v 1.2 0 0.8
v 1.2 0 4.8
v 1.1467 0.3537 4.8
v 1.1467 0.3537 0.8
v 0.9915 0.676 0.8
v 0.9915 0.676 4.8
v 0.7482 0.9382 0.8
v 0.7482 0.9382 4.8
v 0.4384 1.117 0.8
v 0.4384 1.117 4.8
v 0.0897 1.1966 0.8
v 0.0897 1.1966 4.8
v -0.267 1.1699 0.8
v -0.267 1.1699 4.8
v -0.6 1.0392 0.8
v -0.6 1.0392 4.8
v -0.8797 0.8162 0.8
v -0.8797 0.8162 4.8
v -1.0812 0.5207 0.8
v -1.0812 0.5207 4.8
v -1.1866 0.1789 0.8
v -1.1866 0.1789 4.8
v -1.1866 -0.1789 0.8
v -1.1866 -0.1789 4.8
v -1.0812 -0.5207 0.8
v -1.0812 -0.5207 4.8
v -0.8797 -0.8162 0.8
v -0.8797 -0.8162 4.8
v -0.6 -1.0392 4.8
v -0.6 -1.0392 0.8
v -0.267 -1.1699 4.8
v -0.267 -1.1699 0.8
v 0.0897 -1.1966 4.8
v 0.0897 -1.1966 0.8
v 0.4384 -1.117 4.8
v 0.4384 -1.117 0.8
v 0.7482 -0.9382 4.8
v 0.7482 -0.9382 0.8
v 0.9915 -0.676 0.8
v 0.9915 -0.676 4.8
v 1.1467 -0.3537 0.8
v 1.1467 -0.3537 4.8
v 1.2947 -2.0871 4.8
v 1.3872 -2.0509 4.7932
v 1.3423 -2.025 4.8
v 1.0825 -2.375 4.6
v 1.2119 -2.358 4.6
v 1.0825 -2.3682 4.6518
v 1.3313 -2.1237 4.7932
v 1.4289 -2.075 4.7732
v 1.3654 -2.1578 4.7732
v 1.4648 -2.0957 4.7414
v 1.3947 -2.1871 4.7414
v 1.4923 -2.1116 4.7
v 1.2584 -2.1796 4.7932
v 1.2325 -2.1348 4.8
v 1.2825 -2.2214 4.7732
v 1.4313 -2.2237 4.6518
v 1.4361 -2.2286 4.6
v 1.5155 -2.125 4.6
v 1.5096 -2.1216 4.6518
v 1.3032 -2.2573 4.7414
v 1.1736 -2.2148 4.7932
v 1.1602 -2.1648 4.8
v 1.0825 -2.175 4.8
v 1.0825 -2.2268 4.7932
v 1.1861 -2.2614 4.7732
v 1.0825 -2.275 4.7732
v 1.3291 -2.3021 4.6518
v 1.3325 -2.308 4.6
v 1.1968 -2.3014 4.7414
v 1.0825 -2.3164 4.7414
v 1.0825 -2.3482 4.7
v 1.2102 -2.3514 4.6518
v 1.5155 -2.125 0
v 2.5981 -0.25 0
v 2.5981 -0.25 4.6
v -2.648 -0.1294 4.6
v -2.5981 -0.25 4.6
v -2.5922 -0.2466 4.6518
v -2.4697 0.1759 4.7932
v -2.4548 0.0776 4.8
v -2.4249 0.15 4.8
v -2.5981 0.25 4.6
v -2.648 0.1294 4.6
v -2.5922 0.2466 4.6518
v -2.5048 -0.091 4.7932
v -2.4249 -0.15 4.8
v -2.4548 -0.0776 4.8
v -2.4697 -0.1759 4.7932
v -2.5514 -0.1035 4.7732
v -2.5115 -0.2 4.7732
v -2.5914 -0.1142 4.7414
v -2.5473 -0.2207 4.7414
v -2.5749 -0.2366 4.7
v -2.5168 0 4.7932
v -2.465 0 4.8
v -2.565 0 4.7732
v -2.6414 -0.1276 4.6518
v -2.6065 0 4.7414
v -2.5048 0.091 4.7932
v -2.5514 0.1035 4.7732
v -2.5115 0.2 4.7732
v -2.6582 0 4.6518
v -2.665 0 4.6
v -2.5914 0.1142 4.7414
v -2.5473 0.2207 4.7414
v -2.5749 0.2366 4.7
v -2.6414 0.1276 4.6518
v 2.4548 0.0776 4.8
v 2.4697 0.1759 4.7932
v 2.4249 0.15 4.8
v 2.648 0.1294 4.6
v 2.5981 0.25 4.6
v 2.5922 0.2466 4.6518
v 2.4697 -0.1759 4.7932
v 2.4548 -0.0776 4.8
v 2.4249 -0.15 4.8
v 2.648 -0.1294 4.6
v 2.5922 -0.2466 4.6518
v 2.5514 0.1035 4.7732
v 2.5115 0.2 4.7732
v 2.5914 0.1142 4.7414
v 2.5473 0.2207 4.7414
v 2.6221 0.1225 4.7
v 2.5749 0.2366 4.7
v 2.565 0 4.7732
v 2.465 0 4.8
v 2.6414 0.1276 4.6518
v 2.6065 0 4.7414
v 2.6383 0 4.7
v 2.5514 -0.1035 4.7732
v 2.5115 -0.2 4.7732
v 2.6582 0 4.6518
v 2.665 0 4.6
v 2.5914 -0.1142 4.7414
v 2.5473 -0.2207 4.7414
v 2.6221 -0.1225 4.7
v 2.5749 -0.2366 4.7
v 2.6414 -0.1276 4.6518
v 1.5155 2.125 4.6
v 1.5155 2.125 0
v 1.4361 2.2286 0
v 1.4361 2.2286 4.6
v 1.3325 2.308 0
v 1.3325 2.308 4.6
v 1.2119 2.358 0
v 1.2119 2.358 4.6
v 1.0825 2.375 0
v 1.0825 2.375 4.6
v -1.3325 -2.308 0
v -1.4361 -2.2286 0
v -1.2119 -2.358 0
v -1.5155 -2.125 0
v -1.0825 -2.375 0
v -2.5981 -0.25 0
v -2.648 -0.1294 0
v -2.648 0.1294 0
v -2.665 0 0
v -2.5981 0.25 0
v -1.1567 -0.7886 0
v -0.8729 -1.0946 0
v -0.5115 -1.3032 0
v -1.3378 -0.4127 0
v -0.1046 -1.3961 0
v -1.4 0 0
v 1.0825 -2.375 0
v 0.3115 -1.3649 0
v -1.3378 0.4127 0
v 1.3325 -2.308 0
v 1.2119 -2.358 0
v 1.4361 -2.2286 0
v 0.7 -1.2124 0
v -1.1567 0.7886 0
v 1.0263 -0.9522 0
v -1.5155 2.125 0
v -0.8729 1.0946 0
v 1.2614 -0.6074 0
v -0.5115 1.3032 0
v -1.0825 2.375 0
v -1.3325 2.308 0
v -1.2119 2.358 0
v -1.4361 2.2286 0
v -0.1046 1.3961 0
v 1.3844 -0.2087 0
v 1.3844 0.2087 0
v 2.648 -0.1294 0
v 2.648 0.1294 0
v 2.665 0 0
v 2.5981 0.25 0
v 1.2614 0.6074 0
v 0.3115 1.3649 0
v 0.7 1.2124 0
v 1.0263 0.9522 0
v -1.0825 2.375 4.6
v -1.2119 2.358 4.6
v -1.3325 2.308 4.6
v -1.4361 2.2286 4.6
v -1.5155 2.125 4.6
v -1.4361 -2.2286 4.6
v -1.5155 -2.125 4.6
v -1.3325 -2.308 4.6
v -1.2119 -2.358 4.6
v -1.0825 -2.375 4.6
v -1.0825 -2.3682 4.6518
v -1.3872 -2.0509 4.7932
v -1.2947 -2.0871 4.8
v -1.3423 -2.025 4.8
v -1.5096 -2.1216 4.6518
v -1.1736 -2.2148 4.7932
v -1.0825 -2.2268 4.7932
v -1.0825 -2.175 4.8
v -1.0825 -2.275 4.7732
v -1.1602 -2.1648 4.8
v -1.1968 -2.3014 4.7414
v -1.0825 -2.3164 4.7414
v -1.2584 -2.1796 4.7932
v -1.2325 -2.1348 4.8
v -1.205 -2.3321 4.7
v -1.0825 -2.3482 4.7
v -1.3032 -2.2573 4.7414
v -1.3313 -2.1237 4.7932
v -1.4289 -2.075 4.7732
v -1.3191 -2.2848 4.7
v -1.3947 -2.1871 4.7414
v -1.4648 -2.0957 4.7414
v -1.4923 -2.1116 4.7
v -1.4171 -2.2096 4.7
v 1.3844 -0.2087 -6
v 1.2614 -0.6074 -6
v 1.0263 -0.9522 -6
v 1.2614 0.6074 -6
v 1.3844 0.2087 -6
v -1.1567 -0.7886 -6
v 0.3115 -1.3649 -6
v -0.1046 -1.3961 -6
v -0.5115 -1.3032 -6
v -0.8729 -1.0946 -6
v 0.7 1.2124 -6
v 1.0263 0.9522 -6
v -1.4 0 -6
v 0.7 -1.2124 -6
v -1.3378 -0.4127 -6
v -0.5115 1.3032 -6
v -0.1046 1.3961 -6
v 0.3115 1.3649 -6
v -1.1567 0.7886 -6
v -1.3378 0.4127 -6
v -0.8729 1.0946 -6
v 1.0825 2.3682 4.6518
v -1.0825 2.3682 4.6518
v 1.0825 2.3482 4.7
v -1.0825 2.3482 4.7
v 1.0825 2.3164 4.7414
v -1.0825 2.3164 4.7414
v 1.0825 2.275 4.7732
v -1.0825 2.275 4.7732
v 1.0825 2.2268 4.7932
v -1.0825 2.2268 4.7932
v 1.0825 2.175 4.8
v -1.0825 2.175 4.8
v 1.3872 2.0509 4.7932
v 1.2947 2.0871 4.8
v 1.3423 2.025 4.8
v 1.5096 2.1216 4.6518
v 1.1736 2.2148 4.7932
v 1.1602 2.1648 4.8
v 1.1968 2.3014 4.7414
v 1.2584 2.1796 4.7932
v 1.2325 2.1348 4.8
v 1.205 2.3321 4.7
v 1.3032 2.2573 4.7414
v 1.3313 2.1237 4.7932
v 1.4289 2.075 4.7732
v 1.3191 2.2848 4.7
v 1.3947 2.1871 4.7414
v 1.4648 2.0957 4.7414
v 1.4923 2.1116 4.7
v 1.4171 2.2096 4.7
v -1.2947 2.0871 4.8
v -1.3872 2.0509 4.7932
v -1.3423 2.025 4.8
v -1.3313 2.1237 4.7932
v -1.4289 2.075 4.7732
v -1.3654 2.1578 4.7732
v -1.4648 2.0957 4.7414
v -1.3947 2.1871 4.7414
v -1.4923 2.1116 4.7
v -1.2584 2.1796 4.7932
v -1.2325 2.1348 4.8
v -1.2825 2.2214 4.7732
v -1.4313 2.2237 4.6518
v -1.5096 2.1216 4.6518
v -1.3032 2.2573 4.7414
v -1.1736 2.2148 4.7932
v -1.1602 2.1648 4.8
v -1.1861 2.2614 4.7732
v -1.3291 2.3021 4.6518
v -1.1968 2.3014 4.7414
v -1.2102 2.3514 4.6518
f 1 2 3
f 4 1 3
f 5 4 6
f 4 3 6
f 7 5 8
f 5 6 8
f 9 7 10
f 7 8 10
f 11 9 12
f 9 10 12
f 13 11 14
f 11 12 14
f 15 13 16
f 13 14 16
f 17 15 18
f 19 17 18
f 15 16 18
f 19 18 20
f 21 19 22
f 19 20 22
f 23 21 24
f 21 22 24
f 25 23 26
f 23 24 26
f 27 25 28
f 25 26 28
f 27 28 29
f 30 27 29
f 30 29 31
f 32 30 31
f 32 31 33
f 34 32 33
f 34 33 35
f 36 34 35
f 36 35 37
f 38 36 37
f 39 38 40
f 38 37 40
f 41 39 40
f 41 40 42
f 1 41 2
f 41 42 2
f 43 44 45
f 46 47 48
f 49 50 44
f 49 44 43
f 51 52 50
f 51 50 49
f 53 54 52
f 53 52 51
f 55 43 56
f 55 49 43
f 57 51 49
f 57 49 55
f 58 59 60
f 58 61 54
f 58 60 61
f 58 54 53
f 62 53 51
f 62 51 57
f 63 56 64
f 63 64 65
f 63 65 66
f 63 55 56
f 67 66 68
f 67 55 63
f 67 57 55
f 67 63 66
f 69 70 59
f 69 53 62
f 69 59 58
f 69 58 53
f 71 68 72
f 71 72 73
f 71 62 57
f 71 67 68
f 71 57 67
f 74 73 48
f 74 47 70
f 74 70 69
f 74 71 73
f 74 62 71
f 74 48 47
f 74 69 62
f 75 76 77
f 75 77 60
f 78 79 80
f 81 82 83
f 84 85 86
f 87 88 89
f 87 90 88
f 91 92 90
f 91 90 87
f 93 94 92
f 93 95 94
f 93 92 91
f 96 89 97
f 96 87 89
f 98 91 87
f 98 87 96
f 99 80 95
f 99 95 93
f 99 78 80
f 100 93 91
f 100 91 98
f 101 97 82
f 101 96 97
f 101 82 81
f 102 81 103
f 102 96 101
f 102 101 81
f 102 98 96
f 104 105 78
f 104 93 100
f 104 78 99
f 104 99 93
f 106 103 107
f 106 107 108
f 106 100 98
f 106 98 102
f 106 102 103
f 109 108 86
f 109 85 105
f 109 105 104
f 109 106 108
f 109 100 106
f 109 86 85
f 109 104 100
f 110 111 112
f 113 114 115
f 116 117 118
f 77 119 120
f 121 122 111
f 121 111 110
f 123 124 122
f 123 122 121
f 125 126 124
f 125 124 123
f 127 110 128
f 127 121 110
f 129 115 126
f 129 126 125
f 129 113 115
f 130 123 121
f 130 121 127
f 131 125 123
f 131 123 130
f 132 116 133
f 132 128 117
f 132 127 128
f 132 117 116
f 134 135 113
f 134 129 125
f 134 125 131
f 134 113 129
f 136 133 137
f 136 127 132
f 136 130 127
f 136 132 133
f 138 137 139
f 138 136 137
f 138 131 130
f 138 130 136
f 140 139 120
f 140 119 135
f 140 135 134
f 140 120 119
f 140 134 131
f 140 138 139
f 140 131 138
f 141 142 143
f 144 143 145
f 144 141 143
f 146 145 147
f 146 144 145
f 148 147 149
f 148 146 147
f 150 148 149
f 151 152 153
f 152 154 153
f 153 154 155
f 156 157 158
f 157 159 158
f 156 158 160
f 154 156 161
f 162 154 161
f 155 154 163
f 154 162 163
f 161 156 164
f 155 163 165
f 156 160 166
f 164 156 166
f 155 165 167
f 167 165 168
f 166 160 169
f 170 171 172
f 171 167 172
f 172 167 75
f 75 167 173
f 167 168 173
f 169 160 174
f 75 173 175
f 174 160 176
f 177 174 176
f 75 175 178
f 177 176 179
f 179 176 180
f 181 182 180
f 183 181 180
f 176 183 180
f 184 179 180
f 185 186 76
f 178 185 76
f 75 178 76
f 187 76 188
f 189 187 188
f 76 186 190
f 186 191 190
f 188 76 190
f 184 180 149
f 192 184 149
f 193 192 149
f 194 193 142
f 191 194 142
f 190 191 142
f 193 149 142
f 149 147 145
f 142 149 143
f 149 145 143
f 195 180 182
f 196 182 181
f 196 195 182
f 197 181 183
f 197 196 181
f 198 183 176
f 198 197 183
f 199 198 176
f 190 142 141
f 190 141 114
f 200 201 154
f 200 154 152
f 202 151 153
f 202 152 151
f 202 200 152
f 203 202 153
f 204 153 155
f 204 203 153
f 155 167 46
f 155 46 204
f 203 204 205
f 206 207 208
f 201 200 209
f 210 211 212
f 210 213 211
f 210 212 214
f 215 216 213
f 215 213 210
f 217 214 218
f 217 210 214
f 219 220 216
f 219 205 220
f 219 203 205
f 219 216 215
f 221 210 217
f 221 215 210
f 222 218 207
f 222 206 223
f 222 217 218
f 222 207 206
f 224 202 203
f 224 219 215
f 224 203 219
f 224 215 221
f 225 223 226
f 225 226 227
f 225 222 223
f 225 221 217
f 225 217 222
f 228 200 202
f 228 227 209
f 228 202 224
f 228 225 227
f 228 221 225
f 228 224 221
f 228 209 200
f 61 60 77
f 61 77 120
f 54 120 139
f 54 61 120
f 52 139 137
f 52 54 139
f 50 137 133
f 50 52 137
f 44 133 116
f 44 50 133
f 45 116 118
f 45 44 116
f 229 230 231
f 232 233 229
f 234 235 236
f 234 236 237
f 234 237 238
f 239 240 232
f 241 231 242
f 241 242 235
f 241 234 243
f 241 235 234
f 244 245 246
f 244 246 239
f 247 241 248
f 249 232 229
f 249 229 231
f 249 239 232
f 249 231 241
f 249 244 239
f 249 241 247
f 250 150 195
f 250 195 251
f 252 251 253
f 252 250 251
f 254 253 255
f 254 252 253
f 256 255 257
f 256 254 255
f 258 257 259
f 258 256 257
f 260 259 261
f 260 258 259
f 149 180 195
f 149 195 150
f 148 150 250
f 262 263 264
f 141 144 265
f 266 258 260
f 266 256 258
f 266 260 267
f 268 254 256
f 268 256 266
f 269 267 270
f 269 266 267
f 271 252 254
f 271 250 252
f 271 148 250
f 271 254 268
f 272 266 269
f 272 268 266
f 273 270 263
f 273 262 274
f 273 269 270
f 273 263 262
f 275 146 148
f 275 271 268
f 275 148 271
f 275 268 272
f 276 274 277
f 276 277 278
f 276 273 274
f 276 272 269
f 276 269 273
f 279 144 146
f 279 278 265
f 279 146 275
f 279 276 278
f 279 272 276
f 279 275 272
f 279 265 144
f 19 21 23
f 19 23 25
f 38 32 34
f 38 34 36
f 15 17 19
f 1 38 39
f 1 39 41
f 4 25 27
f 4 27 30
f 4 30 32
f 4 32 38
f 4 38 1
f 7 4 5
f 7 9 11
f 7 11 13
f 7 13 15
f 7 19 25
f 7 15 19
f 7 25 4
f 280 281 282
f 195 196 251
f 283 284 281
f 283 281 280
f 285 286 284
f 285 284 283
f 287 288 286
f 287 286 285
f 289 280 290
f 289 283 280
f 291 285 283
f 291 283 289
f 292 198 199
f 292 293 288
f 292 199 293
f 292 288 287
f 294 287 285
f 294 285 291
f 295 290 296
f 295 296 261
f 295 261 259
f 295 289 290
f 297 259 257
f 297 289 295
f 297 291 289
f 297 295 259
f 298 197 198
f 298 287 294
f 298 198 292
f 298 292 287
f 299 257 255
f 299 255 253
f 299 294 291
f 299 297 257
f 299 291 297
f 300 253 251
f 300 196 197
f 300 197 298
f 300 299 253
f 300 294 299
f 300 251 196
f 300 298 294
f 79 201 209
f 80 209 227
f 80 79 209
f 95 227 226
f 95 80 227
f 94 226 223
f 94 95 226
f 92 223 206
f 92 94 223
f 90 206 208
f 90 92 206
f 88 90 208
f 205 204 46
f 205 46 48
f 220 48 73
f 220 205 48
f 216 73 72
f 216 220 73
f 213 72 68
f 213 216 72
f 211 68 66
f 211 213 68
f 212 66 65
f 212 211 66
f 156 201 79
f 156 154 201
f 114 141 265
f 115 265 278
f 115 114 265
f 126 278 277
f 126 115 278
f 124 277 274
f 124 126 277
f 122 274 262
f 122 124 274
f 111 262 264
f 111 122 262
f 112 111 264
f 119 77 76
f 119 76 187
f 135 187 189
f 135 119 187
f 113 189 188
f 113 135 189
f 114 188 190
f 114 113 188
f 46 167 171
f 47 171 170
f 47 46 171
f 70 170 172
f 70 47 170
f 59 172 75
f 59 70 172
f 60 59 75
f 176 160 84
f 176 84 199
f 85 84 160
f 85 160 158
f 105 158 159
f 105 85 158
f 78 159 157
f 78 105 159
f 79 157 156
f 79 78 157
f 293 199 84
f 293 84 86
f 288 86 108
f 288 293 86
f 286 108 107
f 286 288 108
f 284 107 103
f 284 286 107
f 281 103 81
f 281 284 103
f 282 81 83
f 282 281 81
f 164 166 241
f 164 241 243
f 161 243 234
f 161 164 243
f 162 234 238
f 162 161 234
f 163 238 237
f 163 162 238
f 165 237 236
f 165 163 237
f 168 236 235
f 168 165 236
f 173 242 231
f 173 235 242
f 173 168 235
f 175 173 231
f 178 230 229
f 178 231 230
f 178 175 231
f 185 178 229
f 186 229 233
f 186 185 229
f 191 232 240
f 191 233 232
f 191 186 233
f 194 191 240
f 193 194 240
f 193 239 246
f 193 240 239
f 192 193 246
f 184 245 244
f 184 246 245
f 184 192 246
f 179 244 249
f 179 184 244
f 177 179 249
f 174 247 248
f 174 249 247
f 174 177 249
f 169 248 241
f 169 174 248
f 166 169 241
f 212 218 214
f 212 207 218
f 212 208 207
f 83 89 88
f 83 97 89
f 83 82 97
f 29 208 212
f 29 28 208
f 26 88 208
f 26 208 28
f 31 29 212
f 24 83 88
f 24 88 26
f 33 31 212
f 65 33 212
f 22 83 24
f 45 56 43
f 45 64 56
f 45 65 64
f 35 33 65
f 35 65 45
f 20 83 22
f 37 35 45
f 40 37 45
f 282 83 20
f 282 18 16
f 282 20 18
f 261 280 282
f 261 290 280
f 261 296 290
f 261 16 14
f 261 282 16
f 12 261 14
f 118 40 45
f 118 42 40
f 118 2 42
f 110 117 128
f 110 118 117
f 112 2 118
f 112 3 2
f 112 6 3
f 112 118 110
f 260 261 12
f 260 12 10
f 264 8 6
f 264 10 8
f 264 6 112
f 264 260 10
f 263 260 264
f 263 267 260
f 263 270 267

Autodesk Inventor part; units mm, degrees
ref_plane "YZ Plane" through (0, 0, 0) normal (1, 0, 0) x (0, 1, 0)
ref_plane "XZ Plane" through (0, 0, 0) normal (0, 1, 0) x (-1, 0, 0)
ref_plane "XY Plane" through (0, 0, 0) normal (0, 0, 1) x (1, 0, 0)
sketch "Sketch1" plane through (0, 0, 0) normal (0, 0, 1) x (1, 0, 0)
  line L0 (2.7424, 0) -> (1.3712, -2.375)
  line L1 (1.3712, -2.375) -> (-1.3712, -2.375)
  line L2 (-1.3712, -2.375) -> (-2.7424, 0)
  line L3 (-2.7424, 0) -> (-1.3712, 2.375)
  line L4 (-1.3712, 2.375) -> (1.3712, 2.375)
  line L5 (1.3712, 2.375) -> (2.7424, 0)
  point P0 (0, 0)
  point P1 (0, 0)
  dimension "d0" = 4.75
extrude "Extrusion1" add sketch "Sketch1" along normal blind 4.8
sketch "Sketch2" plane through (0, 0, 0) normal (0, 0, -1) x (-1, 0, 0)
  circle A0 centre (0, 0) radius 1.4
  dimension "d3" = 2.8
extrude "Extrusion2" add sketch "Sketch2" along normal blind 6
sketch "Sketch3" plane through (0, 0, 4.8) normal (0, 0, 1) x (1, 0, 0)
  circle A0 centre (0, 0) radius 1.2
  dimension "d6" = 2.4
extrude "Extrusion3" cut sketch "Sketch3" against normal blind 4
fillet "Fillet1" radius 0.5 6 edges at (-2.7424, 0, 2.4) (-1.3712, -2.375, 2.4) (1.3712, -2.375, 2.4) (2.7424, 0, 2.4) (1.3712, 2.375, 2.4) (-1.3712, 2.375, 2.4)
fillet "Fillet2" radius 0.2 12 edges at (-2.0568, 1.1875, 4.8) (-2.6651, 0, 4.8) (-2.0568, -1.1875, 4.8) (-1.3325, -2.308, 4.8) (0, -2.375, 4.8) (1.3325, -2.308, 4.8) (2.0568, -1.1875, 4.8) (2.6651, 0, 4.8) (2.0568, 1.1875, 4.8) (1.3325, 2.308, 4.8) (0, 2.375, 4.8) (-1.3325, 2.308, 4.8)
properties part number "5207953-3"
